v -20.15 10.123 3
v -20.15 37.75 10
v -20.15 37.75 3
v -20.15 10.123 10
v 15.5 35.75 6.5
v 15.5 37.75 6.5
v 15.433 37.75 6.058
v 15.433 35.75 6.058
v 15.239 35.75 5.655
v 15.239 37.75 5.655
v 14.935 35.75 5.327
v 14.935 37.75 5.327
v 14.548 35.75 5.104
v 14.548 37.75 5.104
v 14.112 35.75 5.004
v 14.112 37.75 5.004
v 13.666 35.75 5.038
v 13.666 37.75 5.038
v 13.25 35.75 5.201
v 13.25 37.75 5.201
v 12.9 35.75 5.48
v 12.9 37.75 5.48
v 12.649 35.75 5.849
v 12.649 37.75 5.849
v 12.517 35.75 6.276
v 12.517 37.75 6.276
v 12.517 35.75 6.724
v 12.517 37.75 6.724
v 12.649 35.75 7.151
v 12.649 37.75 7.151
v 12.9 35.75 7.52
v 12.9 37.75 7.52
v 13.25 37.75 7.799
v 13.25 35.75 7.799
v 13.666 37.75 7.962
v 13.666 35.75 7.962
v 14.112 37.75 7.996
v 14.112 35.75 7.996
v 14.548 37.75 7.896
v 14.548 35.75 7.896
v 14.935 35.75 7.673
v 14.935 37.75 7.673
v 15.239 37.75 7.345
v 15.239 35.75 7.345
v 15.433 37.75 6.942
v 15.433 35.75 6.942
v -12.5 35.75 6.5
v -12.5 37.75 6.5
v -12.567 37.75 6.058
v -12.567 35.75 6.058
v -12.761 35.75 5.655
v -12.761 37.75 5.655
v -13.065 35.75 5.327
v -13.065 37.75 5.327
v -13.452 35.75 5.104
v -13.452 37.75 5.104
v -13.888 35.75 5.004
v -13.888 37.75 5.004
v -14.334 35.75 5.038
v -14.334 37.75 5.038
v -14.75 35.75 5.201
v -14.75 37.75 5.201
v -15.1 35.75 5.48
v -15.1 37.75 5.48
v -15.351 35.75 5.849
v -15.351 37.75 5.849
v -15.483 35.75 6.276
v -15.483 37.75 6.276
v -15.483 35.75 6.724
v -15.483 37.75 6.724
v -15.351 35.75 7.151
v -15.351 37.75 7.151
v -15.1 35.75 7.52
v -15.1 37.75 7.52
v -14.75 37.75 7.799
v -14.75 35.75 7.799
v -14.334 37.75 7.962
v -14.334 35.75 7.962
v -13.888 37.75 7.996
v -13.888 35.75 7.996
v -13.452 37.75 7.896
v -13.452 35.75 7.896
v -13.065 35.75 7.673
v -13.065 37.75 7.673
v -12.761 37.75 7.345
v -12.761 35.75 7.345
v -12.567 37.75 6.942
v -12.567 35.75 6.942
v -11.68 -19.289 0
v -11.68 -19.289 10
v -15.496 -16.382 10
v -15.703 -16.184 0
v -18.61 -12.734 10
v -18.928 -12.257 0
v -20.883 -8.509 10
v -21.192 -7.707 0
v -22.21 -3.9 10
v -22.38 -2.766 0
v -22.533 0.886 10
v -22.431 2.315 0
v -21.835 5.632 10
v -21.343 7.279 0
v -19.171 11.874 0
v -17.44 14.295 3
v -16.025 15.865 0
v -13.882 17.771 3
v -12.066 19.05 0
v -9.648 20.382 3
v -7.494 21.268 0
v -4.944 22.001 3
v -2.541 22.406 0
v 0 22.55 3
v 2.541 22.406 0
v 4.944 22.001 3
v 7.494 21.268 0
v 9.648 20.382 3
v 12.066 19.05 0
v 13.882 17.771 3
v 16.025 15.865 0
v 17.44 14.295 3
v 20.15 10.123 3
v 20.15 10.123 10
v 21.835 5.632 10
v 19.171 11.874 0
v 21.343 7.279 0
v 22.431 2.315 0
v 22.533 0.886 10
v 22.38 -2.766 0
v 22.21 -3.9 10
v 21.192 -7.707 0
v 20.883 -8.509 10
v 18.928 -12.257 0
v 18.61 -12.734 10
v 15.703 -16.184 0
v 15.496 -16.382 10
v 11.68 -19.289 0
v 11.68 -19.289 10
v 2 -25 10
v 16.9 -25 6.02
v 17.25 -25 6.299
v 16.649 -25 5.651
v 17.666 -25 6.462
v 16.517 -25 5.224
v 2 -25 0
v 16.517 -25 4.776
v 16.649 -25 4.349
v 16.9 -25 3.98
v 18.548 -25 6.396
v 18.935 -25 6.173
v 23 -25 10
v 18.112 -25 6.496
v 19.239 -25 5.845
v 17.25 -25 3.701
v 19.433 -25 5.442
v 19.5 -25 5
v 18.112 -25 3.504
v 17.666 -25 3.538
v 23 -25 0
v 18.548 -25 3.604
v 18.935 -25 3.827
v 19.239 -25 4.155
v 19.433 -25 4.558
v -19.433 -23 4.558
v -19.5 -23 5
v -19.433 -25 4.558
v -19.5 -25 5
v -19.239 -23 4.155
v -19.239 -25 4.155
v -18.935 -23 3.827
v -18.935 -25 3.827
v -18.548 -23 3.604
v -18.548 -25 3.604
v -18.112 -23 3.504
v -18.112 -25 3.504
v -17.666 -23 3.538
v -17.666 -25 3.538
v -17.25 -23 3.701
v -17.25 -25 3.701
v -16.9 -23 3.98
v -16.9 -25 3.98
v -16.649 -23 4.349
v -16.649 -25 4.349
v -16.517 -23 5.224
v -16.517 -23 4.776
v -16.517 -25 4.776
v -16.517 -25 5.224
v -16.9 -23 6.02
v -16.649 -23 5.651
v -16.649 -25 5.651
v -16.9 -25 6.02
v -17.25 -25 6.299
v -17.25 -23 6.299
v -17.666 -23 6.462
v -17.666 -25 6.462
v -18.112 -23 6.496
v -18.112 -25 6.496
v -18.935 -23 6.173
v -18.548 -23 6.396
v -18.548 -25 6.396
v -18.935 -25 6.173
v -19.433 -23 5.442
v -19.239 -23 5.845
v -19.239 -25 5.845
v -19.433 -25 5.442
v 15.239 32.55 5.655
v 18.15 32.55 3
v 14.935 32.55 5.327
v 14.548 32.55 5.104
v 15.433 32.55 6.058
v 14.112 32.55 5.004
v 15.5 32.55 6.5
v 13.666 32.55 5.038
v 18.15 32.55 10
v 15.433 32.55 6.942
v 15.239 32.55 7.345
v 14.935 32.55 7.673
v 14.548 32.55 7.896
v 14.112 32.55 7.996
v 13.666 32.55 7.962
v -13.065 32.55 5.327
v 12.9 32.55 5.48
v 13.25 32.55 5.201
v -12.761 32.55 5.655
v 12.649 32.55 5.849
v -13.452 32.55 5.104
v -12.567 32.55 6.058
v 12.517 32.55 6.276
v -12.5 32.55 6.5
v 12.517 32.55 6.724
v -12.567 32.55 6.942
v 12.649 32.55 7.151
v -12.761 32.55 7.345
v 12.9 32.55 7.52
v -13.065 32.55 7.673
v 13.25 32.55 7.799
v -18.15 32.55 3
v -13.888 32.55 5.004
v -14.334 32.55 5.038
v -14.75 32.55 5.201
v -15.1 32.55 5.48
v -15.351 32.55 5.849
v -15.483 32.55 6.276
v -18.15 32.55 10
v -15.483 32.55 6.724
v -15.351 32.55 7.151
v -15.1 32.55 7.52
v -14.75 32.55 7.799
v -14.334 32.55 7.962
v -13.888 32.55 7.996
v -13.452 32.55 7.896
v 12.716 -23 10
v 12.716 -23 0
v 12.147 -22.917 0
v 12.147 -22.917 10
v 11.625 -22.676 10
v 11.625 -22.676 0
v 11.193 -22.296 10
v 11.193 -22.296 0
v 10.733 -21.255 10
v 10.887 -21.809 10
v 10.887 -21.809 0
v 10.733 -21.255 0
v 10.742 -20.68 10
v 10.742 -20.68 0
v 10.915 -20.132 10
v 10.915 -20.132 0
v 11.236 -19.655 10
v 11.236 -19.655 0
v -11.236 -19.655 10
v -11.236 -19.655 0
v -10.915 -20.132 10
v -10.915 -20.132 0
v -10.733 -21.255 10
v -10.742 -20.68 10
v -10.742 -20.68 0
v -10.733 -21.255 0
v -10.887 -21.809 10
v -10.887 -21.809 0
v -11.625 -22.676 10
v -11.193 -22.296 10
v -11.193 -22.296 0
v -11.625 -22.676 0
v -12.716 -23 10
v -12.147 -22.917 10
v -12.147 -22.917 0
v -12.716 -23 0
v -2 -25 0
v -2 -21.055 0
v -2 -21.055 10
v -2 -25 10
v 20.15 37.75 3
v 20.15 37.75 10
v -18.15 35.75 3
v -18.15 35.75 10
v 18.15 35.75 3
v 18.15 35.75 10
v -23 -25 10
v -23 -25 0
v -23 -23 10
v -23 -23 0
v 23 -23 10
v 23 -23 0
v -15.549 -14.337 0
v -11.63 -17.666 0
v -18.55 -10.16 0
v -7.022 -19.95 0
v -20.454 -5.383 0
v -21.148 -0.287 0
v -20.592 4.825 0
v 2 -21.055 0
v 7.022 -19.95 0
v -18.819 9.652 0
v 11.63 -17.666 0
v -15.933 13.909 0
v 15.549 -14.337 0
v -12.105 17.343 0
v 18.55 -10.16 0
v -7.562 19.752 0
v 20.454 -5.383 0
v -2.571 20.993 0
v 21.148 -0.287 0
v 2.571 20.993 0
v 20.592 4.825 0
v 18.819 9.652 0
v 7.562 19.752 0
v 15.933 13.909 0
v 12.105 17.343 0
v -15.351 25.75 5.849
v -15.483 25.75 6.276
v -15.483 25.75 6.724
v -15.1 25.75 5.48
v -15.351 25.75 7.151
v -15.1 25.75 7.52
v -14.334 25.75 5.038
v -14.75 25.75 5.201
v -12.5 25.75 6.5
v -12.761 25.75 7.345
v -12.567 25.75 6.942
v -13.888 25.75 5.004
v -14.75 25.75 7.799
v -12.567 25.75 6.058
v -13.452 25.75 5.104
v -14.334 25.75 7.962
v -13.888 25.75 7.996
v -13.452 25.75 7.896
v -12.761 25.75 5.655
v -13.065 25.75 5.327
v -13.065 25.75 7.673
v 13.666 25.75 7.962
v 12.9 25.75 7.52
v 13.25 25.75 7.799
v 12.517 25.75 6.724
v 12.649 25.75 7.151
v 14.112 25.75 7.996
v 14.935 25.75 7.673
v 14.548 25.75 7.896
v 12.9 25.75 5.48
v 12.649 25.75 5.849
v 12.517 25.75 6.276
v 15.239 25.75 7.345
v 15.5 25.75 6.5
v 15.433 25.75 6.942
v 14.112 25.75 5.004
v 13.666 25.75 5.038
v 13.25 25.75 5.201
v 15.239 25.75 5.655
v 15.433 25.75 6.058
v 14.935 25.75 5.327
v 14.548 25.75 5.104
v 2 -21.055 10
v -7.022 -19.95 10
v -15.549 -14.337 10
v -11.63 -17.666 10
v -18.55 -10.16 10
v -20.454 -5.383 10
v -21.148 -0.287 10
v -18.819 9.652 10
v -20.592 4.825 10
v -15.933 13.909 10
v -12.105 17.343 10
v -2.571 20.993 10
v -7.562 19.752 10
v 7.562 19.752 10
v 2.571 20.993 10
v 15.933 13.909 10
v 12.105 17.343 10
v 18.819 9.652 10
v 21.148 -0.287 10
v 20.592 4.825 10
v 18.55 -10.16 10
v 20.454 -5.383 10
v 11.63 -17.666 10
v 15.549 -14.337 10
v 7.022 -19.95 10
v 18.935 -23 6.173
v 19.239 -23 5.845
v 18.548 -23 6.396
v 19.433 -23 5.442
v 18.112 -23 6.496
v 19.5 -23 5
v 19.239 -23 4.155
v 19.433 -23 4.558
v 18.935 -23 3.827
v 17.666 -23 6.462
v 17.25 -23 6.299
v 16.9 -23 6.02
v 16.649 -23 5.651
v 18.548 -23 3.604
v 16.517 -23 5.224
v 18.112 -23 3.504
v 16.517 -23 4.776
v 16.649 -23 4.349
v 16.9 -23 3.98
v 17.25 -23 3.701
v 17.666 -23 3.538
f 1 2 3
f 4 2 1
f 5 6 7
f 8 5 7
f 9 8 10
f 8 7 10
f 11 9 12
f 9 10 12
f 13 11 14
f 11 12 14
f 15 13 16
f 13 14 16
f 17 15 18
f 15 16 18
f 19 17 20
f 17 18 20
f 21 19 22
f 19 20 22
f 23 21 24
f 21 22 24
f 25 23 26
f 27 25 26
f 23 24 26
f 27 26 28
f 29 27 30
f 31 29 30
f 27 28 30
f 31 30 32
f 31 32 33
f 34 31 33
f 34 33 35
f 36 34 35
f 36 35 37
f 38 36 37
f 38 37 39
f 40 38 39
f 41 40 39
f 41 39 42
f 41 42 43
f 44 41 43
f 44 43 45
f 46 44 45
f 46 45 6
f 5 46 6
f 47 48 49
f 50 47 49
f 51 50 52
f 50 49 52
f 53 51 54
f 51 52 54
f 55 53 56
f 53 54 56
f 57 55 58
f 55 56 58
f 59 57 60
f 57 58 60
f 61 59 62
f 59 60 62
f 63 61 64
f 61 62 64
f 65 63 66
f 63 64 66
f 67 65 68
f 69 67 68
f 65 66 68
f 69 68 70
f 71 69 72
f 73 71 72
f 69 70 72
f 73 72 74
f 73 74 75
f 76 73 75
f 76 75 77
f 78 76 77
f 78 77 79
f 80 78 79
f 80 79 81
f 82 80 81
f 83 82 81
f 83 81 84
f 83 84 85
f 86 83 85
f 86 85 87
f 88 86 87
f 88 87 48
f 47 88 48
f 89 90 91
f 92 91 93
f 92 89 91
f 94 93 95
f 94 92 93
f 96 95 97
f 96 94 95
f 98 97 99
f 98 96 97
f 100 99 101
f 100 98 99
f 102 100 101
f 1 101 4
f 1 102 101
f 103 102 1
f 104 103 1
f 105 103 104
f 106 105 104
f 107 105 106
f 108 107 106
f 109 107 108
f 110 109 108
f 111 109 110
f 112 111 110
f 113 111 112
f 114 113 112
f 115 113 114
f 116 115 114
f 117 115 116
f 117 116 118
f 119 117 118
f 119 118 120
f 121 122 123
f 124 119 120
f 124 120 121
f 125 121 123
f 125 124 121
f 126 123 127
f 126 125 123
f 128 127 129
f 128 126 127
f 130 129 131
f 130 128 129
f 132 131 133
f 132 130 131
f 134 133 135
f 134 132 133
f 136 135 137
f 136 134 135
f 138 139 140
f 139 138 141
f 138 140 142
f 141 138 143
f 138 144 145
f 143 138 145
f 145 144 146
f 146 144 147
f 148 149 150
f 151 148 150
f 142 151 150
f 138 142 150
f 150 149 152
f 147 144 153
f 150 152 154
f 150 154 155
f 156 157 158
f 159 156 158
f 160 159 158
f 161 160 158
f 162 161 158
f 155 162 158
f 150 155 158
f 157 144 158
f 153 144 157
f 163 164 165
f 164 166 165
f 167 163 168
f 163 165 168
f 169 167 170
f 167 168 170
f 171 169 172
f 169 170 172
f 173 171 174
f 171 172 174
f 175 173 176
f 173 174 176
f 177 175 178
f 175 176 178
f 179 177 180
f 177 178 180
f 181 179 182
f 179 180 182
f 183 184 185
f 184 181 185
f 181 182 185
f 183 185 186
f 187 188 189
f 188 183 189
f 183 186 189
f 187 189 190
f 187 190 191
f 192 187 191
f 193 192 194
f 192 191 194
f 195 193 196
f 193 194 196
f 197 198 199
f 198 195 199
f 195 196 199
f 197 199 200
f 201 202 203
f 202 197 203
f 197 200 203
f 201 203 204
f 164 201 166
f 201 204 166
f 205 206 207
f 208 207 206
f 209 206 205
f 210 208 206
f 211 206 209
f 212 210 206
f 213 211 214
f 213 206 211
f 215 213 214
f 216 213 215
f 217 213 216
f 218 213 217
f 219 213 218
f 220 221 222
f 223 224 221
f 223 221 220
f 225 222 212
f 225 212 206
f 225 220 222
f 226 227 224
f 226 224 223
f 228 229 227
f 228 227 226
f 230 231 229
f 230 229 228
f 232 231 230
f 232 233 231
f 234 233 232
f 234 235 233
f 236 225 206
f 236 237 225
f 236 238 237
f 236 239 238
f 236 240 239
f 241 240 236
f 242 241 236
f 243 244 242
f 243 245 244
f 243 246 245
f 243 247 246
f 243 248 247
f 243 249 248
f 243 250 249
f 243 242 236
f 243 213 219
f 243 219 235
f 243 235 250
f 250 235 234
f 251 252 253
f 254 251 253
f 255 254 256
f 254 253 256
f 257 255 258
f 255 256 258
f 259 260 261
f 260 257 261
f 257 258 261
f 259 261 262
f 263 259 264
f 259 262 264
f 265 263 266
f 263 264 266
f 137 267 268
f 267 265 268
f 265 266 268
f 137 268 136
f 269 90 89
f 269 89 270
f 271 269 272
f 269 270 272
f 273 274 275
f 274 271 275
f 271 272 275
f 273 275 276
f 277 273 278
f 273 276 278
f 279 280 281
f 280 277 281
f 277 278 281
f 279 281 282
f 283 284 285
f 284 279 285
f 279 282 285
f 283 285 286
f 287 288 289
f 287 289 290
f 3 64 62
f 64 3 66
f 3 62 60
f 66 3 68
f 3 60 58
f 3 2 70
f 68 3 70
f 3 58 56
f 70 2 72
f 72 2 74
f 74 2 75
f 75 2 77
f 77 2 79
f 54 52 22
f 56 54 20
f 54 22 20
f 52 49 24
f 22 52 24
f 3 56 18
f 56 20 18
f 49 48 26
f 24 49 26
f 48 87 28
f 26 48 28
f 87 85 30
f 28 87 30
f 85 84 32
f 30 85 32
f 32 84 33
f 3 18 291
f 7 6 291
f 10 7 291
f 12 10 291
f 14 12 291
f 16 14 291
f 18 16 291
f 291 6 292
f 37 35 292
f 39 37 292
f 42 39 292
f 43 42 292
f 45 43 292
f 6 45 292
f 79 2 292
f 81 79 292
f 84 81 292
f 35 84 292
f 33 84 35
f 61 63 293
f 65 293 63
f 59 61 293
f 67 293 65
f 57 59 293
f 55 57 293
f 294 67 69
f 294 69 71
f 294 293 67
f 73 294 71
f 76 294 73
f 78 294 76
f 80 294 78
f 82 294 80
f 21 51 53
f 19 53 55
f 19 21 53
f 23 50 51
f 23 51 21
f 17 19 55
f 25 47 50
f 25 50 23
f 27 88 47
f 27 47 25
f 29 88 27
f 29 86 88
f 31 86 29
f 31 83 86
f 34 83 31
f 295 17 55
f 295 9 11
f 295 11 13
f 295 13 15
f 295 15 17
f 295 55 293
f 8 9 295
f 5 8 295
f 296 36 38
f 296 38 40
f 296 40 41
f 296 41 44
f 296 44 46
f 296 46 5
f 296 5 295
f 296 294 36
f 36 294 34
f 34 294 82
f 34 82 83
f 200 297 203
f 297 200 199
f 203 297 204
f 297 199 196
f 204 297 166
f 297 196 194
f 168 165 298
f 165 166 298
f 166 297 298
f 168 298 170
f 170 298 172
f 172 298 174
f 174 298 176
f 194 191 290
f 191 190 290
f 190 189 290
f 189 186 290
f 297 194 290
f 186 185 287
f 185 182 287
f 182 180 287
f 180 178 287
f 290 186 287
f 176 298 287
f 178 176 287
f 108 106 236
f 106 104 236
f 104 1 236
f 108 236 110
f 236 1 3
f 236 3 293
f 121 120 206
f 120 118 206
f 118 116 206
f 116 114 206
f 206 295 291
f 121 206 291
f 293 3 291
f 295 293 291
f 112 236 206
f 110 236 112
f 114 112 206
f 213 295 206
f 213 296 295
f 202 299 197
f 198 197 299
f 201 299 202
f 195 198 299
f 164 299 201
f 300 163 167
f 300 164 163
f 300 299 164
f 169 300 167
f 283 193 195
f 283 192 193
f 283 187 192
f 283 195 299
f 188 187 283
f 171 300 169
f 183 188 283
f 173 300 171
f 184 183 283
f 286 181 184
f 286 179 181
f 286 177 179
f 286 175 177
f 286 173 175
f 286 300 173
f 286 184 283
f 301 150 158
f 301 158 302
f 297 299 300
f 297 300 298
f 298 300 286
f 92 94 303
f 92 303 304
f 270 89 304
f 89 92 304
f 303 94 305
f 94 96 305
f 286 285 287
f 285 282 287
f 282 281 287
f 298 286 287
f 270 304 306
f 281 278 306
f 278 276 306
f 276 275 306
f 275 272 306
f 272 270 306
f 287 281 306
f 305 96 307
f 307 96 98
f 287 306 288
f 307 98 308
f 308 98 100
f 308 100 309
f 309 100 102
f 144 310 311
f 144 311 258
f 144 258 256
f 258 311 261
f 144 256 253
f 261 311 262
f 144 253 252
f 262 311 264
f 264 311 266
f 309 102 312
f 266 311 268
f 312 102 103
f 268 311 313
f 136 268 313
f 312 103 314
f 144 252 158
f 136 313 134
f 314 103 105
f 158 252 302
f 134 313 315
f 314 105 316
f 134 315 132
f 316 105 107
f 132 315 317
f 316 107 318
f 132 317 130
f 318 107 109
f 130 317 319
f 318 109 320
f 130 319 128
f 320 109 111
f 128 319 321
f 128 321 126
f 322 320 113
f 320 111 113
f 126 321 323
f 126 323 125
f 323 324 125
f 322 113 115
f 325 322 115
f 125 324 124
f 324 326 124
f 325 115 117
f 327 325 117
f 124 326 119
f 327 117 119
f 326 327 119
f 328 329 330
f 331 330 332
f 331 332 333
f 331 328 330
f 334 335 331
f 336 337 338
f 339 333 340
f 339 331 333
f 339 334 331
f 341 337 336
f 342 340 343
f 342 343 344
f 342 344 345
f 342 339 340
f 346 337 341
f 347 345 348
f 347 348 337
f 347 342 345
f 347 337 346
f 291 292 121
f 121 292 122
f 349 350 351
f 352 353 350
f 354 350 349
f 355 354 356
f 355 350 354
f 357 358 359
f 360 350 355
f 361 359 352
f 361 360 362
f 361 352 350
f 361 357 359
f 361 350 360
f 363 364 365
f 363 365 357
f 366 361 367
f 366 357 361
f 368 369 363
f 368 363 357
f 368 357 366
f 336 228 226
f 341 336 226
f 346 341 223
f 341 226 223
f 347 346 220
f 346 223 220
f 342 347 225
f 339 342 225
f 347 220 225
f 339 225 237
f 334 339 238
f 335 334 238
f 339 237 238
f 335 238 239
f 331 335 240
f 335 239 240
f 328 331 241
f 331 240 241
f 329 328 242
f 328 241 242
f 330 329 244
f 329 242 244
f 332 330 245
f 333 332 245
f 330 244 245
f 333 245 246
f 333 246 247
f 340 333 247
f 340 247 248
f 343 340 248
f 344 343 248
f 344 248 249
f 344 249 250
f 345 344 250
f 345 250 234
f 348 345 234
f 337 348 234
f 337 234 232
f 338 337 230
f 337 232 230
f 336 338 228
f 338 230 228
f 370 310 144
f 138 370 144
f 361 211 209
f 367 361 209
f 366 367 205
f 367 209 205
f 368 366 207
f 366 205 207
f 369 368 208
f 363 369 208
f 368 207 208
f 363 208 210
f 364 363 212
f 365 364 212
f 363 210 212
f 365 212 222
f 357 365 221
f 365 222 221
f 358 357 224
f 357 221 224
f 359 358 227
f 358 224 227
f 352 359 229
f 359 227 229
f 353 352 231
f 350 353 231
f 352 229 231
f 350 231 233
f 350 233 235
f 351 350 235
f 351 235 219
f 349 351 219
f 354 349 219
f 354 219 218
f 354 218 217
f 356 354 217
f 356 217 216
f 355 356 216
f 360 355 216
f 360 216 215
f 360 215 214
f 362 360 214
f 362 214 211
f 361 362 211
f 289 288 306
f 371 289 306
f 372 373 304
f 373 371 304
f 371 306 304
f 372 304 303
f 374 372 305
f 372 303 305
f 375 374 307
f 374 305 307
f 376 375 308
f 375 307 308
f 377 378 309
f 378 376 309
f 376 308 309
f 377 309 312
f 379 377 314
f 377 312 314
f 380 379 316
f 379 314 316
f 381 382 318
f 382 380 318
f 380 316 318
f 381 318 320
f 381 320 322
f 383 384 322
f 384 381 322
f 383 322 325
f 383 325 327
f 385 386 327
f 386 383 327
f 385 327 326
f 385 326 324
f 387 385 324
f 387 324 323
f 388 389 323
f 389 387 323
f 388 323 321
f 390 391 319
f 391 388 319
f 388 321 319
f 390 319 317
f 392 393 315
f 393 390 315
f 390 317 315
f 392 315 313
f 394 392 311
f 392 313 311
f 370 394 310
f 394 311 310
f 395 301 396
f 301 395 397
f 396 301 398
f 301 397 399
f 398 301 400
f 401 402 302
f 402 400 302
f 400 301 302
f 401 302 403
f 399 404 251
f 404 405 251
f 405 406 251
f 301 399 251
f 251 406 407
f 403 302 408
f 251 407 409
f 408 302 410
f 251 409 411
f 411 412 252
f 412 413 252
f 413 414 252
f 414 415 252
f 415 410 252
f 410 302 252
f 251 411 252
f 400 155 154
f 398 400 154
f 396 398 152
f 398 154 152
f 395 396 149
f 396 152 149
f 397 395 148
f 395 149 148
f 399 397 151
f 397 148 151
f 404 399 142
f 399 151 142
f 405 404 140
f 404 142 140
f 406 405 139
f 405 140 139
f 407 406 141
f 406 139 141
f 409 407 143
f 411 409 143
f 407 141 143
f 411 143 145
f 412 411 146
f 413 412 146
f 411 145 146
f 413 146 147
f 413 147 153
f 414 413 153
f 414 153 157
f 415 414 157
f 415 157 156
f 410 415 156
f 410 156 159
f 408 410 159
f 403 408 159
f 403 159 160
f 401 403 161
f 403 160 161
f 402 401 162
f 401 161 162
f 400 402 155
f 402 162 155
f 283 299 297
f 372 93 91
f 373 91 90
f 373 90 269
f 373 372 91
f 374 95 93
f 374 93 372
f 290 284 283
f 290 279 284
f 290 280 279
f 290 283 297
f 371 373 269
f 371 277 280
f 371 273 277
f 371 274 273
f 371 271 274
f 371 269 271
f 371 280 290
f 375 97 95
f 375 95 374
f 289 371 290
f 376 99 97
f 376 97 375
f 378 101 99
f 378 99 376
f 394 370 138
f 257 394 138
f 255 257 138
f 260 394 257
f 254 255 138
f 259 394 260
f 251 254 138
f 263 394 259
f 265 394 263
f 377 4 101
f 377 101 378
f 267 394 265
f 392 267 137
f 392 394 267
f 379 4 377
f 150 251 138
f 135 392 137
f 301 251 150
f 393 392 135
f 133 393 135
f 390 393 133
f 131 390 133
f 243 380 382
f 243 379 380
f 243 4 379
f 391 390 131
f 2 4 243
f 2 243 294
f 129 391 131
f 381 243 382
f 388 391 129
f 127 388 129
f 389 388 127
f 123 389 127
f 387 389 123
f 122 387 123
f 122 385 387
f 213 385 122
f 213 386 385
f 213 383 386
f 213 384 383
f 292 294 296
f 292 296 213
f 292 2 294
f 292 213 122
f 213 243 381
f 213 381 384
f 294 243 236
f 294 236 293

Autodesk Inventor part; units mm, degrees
ref_plane "YZ Plane" through (0, 0, 0) normal (1, 0, 0) x (0, 1, 0)
ref_plane "XZ Plane" through (0, 0, 0) normal (0, 1, 0) x (-1, 0, 0)
ref_plane "XY Plane" through (0, 0, 0) normal (0, 0, 1) x (1, 0, 0)
sketch "Sketch1" plane through (0, 0, 0) normal (0, 0, 1) x (1, 0, 0)
  circle A0 centre (0, 0) radius 21.15 construction
  line L0 (-18, -25) -> (18, -25) construction
  line L1 (-18, -25) -> (-18, -38.1522) construction
  line L2 (18, -25) -> (18, -38.1522) construction
  line L3 (-23, -23) -> (-23, -25)
  line L4 (-23, -25) -> (-2, -25)
  line L5 (-2, -21.0552) -> (-2, -25)
  line L6 (2, -21.0552) -> (2, -25)
  line L7 (2, -25) -> (23, -25)
  line L8 (23, -25) -> (23, -23)
  line L9 (23, -23) -> (12.7162, -23)
  line L10 (-23, -23) -> (-12.7162, -23)
  arc A1 (11.6803, -19.2892) -> (-11.6803, -19.2892) centre (0, 0) ccw
  arc A2 (2, -21.0552) -> (-2, -21.0552) centre (0, 0) ccw
  arc A3 (11.6803, -19.2892) -> (12.7162, -23) centre (12.7162, -21) ccw
  arc A4 (-12.7162, -23) -> (-11.6803, -19.2892) centre (-12.7162, -21) ccw
  point P0 (0, -25)
  dimension "d13" = 42.3
  dimension "d1" = 25
  dimension "d2" = 36
  dimension "d3" = 2
  dimension "d4" = 1.4
  dimension "d5" = 5
  dimension "d6" = 2
  dimension "d7" = 4
extrude "Extrusion1" add sketch "Sketch1" along normal blind 10
sketch "Sketch2" plane through (2, -25, 0) normal (0, -1, 0) x (1, 0, 0)
  circle A0 centre (16, 5) radius 1.5
  line L0 (21, 0) -> (21, 10) projected
  point P0 (-2, 0)
  point P1 (16, 0)
  point P2 (16, 0)
  point P3 (16, 0)
  point P4 (21, 5)
  dimension "d10" = 3
extrude "Extrusion2" cut sketch "Sketch2" against normal up to surface (2 mm away)
mirror "Mirror1" about plane through (0, 0, 0) normal (1, 0, 0) of "Extrusion2"
sketch "Sketch3" plane through (0, 0, 10) normal (0, 0, 1) x (1, 0, 0)
  arc A0 (21.9303, 5.25) -> (-21.9303, 5.25) centre (0, 0) ccw projected
  line L0 (-18.15, 35.75) -> (18.15, 35.75)
  line L1 (18.15, 35.75) -> (18.15, 32.55)
  line L2 (18.15, 32.55) -> (-18.15, 32.55)
  line L3 (-18.15, 32.55) -> (-18.15, 35.75)
  line L4 (-20.15, 37.75) -> (20.15, 37.75)
  line L5 (20.15, 37.75) -> (20.15, 10.1232)
  arc A1 (11.6803, -19.2892) -> (-11.6803, -19.2892) centre (0, 0) ccw projected
  line L6 (-20.15, 37.75) -> (-20.15, 10.1232)
  point P0 (0, 35.75)
  dimension "d14" = 3.2
  dimension "d15" = 36.3
  dimension "d16" = 10
  dimension "d17" = 2
  dimension "d18" = 2
  dimension "d19" = 2
extrude "Extrusion3" add sketch "Sketch3" against normal blind 7
sketch "Sketch4" plane through (-20.15, 37.75, 10) normal (0, 1, 0) x (1, 0, 0)
  circle A0 centre (34.15, 3.5) radius 1.5
  circle A1 centre (6.15, 3.5) radius 1.5
  line L0 (34.15, 3.5) -> (6.15, 3.5) construction
  line L1 (0, 7) -> (40.3, 7) construction
  line L2 (0, 0) -> (0, 7) projected
  point P0 (20.15, 10)
  point P1 (20.15, 3.5)
  point P2 (20.15, 7)
  point P3 (0, 3.5)
  dimension "d22" = 3
  dimension "d23" = 3
  dimension "d24" = 28
extrude "Extrusion4" cut sketch "Sketch4" against normal blind 12
properties part number "OmegaRing" material "ABS Plastic"
